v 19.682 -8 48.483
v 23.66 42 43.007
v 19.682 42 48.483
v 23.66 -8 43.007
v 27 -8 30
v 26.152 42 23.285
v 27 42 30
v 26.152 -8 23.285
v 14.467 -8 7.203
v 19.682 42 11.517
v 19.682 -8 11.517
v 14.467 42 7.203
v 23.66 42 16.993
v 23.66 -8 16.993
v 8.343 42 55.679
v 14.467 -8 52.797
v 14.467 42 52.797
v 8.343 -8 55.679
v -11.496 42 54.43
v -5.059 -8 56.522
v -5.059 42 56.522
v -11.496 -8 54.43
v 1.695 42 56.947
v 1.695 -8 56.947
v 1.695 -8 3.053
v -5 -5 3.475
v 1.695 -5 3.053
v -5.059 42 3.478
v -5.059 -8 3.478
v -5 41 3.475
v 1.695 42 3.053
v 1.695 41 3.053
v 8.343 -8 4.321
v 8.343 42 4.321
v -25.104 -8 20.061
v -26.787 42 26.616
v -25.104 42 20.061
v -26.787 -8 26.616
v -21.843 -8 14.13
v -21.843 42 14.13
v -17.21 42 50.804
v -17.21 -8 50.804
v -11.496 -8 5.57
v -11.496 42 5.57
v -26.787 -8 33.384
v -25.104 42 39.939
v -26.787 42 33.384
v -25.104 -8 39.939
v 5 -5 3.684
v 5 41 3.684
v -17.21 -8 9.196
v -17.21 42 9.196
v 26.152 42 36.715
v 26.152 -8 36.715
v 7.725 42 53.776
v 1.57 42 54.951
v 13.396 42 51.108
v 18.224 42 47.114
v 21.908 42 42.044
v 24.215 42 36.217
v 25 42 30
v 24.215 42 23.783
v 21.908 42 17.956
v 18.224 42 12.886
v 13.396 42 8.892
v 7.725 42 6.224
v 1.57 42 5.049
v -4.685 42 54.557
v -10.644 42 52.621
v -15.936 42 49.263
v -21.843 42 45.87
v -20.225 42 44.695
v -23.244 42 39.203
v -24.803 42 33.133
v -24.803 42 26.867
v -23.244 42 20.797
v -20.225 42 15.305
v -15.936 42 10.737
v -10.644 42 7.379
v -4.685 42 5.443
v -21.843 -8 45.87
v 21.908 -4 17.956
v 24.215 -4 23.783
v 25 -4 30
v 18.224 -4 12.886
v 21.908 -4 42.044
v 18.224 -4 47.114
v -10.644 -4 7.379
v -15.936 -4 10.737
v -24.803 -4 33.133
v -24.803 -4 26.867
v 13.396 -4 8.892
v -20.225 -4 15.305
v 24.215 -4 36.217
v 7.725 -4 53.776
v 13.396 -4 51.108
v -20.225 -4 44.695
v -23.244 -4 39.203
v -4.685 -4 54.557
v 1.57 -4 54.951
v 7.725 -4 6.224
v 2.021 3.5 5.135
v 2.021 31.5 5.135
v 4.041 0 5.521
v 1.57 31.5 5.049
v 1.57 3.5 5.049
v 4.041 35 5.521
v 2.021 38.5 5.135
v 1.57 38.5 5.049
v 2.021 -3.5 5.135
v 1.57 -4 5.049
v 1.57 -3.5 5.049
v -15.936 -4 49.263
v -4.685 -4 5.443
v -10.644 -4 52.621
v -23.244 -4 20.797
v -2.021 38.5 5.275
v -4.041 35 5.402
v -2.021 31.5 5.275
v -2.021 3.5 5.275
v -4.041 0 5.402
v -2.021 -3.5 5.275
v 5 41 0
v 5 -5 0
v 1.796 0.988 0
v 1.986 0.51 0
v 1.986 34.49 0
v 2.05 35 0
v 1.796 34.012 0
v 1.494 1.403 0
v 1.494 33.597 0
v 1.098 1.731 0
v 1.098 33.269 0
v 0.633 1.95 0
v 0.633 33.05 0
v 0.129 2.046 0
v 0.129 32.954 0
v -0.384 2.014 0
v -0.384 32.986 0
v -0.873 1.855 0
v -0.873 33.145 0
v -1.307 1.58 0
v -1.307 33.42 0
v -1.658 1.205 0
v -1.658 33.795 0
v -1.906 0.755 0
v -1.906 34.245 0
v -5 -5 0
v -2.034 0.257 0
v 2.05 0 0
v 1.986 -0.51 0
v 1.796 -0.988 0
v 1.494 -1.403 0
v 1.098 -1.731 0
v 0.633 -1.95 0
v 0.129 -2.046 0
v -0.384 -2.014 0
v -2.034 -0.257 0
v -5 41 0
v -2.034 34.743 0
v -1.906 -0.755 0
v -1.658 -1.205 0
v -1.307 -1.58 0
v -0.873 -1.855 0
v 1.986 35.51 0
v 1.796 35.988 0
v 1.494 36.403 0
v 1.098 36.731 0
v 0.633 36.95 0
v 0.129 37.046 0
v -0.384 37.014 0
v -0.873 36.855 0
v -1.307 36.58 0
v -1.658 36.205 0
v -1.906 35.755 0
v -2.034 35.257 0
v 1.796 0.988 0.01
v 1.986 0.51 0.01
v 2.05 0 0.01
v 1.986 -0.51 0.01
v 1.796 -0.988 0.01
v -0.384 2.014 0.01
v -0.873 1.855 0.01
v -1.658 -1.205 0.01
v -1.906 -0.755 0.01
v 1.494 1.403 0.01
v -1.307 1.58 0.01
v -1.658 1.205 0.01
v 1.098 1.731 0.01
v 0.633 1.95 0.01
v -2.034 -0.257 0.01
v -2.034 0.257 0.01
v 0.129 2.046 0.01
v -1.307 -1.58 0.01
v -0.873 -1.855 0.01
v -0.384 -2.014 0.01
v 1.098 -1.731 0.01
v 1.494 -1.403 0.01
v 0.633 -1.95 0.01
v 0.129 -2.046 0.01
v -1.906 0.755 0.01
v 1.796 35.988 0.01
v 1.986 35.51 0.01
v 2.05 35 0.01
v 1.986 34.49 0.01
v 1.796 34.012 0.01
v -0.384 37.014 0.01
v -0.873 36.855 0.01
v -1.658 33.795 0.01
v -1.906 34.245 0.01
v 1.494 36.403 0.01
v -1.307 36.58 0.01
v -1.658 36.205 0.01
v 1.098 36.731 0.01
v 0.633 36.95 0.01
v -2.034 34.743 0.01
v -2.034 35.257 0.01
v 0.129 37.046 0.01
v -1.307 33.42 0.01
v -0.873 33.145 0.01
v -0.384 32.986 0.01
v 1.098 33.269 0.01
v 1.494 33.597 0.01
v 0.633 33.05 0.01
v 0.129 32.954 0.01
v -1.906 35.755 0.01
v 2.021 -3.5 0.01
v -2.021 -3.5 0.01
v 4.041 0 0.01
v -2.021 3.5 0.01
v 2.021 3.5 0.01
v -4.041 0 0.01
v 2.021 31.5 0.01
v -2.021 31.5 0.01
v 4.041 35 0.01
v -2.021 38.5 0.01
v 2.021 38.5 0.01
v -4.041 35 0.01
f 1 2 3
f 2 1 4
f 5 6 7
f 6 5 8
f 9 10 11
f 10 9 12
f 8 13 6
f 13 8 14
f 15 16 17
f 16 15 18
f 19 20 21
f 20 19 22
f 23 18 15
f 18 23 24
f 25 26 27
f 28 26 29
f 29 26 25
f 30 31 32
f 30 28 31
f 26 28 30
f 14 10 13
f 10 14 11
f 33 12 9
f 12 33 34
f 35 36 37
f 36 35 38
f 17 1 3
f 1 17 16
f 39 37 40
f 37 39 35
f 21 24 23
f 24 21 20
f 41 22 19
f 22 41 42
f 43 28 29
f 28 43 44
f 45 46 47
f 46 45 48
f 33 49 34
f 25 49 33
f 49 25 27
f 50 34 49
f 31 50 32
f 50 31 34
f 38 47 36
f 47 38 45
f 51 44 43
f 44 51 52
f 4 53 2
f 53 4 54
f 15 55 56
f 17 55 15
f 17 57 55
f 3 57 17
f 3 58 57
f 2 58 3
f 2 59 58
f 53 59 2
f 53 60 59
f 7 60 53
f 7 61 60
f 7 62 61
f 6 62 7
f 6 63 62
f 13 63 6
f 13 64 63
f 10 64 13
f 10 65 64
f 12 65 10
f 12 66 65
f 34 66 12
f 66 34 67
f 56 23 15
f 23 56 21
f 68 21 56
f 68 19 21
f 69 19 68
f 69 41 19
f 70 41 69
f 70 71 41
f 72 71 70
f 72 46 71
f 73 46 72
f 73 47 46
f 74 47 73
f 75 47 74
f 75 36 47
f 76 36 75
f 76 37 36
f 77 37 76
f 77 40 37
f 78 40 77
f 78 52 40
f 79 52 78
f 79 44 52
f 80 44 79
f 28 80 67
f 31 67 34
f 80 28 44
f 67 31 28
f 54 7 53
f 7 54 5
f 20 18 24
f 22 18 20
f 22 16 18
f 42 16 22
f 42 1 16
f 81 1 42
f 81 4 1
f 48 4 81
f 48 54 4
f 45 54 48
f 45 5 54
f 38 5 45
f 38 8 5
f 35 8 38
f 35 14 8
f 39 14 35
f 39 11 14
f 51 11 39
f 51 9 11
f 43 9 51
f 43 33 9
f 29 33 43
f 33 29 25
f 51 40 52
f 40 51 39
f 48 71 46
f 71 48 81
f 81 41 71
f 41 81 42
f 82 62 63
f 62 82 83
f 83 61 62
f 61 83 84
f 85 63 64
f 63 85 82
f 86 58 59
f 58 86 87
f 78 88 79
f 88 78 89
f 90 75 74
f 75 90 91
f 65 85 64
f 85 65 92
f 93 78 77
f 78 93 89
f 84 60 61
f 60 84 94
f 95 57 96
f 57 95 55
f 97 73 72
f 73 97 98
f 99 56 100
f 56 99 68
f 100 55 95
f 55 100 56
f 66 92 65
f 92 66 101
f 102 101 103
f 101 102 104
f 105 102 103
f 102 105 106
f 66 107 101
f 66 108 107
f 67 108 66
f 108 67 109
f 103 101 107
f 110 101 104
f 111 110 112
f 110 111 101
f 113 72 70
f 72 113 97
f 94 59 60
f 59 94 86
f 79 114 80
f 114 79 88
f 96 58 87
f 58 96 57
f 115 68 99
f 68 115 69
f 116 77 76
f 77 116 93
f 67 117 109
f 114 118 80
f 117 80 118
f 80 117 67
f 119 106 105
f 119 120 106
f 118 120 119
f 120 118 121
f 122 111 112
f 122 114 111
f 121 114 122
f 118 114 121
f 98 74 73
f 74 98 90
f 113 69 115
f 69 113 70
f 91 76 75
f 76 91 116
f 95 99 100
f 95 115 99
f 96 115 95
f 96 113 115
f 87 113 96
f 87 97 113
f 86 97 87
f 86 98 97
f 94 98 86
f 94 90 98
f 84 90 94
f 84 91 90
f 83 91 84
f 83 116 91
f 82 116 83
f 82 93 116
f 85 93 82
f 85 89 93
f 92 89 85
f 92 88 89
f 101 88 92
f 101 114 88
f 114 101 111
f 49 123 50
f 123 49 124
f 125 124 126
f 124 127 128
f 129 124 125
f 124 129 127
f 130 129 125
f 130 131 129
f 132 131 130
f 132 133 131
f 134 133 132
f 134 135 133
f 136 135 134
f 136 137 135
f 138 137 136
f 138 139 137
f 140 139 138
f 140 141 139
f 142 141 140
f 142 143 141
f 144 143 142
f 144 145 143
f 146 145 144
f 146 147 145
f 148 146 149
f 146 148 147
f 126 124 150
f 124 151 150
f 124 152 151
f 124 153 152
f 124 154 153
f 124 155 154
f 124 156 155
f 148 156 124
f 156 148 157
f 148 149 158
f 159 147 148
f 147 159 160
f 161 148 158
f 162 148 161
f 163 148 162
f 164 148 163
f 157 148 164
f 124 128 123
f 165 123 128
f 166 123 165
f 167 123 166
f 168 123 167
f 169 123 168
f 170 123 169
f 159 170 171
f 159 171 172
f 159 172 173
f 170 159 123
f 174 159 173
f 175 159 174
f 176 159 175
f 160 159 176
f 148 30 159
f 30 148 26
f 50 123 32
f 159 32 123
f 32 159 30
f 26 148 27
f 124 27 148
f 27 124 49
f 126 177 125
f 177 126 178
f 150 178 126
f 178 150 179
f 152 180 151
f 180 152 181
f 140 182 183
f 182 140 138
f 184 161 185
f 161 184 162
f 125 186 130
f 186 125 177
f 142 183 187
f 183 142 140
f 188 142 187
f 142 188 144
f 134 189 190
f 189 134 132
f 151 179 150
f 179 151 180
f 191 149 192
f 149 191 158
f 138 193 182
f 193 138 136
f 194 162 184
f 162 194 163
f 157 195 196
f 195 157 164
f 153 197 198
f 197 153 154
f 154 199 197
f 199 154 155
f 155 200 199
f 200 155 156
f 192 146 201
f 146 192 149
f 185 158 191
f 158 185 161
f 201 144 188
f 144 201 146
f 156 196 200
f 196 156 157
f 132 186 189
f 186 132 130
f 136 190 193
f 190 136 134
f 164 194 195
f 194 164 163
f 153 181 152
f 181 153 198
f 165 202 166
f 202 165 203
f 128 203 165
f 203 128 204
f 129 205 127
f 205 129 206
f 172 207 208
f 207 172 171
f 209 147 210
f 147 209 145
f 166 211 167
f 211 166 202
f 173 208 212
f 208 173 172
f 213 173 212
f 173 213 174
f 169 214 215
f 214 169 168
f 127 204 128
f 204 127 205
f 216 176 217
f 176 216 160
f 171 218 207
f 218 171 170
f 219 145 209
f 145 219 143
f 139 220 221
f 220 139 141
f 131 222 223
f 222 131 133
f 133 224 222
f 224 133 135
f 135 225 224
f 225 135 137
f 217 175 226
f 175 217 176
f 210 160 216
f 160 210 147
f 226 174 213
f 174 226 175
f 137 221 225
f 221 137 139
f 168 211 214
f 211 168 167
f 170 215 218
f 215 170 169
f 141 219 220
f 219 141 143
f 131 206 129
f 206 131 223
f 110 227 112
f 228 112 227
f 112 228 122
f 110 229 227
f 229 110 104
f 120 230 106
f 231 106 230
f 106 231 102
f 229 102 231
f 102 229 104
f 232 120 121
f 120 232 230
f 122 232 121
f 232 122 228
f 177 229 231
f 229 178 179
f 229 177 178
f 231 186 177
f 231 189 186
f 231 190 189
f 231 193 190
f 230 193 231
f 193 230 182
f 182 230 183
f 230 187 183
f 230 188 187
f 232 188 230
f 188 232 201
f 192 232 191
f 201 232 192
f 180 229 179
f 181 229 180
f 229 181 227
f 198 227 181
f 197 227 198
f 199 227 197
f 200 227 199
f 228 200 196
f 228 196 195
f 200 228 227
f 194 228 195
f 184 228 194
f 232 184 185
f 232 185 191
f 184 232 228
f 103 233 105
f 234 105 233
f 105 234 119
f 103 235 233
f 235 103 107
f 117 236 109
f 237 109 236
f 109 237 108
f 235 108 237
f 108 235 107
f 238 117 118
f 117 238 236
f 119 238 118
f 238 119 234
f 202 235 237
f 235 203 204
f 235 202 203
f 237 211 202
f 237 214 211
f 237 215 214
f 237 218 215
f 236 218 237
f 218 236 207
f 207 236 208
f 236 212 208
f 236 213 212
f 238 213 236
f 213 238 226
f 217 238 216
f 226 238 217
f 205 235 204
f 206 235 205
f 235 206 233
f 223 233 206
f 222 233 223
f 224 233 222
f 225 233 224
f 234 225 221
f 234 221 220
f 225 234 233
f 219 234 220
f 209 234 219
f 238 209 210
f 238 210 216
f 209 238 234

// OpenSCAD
// file: data-access.scad
// Norm Nuts and Bolts - a OpenSCAD library
// Copyright (C) 2012  Johannes Kneer

// This program is free software: you can redistribute it and/or modify
// it under the terms of the GNU General Public License as published by
// the Free Software Foundation, either version 3 of the License, or
// (at your option) any later version.

// This program is distributed in the hope that it will be useful,
// but WITHOUT ANY WARRANTY; without even the implied warranty of
// MERCHANTABILITY or FITNESS FOR A PARTICULAR PURPOSE.  See the
// GNU General Public License for more details.

// You should have received a copy of the GNU General Public License
// along with this program.  If not, see <http://www.gnu.org/licenses/>.


// DATABASE ACCESS FUNCTIONS AND CONSTANTS



// == CONSTANTS ==

// screw table access keys
_NB_S_DESC            = 0;
_NB_S_FAMKEY			    = 1;
_NB_S_LENGTH          = 2;
_NB_S_NOTHREAD_LENGTH = 3;

_NB_F_DESC			      = 0;
_NB_F_OUTER_DIA       = 1;
_NB_F_INNER_DIA       = 2;
_NB_F_LEAD            = 3;
_NB_F_KEY             = 4;
_NB_F_KEY_DEPTH       = 5;
_NB_F_HEAD_HEIGHT     = 6;
_NB_F_HEAD_DIA        = 7;
_NB_F_NUT_KEY         = 8;
_NB_F_NUT_HEIGHT      = 9;
_NB_F_PITCH_FINE      = 10;
_NB_F_PITCH_MEDIUM    = 11;
_NB_F_PITCH_COARSE    = 12;


// == FUNCTIONS ==

// _get_screw("descriptor")   with descriptor = M8x25
//   find the line for a general object in the data matrix

function _get_screw(n) = data_screw[search([n], data_screw)[0]];
function _get_screw_fam(n) = data_screw_fam[search([_get_screw(n)[_NB_S_FAMKEY]], data_screw_fam)[0]];

function _get_fam(n) = data_screw_fam[search([n], data_screw_fam)[0]];


// _get_XXXXX("descriptor") functions
// find a single property in the database

function _get_desc(n)        = _get_screw(n)[_NB_S_DESC];
function _get_famkey(n)         = _get_screw(n)[_NB_S_FAMKEY];
function _get_length(n)      = _get_screw(n)[_NB_S_LENGTH];
function _get_nt_length(n)   = _get_screw(n)[_NB_S_NOTHREAD_LENGTH];

function _get_outer_dia(n)   = _get_screw_fam(n)[_NB_F_OUTER_DIA];
function _get_inner_dia(n)   = _get_screw_fam(n)[_NB_F_INNER_DIA];
function _get_lead(n)        = _get_screw_fam(n)[_NB_F_LEAD];
function _get_head_height(n) = _get_screw_fam(n)[_NB_F_HEAD_HEIGHT];
function _get_head_dia(n)    = _get_screw_fam(n)[_NB_F_HEAD_DIA];
function _get_nut_key(n)     = _get_screw_fam(n)[_NB_F_NUT_KEY];
function _get_nut_height(n)  = _get_screw_fam(n)[_NB_F_NUT_HEIGHT];
function _get_fine_pitch(n)  = _get_screw_fam(n)[_NB_F_PITCH_FINE];
function _get_medium_pitch(n)  = _get_screw_fam(n)[_NB_F_PITCH_MEDIUM];
function _get_coarse_pitch(n)  = _get_screw_fam(n)[_NB_F_PITCH_COARSE];
// main file
include <cyl_head_bolt.scad>;
$fn = 25;
dikte=4;
hoogte=50;

module sqBrace(x) {
  difference() {
    translate([-4,-5,0]) cube([8, x*3-10, dikte+1]);
    translate([0, 0, 50+e]) hole_through(name="M4", l=50+5, cld=0.1, h=10, hcld=0.4);
    translate([0, 0, 2]) hole_through(name="M5", l=55, cld=0.1, h=10, hcld=0.4);

    translate([0, x*3-20,  50+e]) hole_through("M4",  l=50+5, cld=0.1, h=10, hcld=0.4);
    translate([0, x*3-20, 2]) hole_through(name="M5", l=55, cld=0.1, h=10, hcld=0.4);
  }
}

module houder() {
  difference() {
    union() {
      translate([-5,-5,0]) 
        cube([10,50-dikte, dikte+1]);
      translate([0,-8,hoogte/2+dikte+1])
        rotate([-90,0,0]) 
          difference() {
            cylinder(d=hoogte+dikte,h=hoogte);
            translate([0,0,dikte]) cylinder(d=hoogte,h=hoogte+dikte);
          }
    }
    translate([0, 0, 50+e]) hole_through(name="M4", l=50+5, cld=0.1, h=10, hcld=0.4);
    translate([0, 35,  50+e]) hole_through("M4",  l=50, cld=0.1, h=10, hcld=0.4);
    translate([0, 00,  50+e]) nutcatch_parallel("M4", l=50);
    translate([0, 35,  50+e]) nutcatch_parallel("M4", l=50);
  }
}

houder();
*sqBrace(x=20);


// == exaM4le nut catches and holes ==
    // rotate([180,0,0]) nutcatch_parallel("M4", l=5);

// echo(_get_screw("M4x8"));
// echo(_get_screw_fam("M5x8"));
// echo(_get_fam("M4"));
// difference() {
//   translate([-15, -15, 0]) cube([80, 30, 50]);
//   *rotate([180,0,0]) nutcatch_parallel("M5", l=5);
//   *translate([0, 0, 50+e]) hole_through(name="M5", l=50+5, cld=0.1, h=10, hcld=0.4);
//   *translate([55, 0, 9+e]) nutcatch_sidecut("M8", l=100, clk=0.1, clh=0.1, clsl=0.1);
//   *translate([55, 0, 50+e]) hole_through(name="M8", l=50+5, cld=0.1, h=10, hcld=0.4);
//   translate([27.5, 0, 50+e]) hole_threaded(name="M5", l=60);
// }
